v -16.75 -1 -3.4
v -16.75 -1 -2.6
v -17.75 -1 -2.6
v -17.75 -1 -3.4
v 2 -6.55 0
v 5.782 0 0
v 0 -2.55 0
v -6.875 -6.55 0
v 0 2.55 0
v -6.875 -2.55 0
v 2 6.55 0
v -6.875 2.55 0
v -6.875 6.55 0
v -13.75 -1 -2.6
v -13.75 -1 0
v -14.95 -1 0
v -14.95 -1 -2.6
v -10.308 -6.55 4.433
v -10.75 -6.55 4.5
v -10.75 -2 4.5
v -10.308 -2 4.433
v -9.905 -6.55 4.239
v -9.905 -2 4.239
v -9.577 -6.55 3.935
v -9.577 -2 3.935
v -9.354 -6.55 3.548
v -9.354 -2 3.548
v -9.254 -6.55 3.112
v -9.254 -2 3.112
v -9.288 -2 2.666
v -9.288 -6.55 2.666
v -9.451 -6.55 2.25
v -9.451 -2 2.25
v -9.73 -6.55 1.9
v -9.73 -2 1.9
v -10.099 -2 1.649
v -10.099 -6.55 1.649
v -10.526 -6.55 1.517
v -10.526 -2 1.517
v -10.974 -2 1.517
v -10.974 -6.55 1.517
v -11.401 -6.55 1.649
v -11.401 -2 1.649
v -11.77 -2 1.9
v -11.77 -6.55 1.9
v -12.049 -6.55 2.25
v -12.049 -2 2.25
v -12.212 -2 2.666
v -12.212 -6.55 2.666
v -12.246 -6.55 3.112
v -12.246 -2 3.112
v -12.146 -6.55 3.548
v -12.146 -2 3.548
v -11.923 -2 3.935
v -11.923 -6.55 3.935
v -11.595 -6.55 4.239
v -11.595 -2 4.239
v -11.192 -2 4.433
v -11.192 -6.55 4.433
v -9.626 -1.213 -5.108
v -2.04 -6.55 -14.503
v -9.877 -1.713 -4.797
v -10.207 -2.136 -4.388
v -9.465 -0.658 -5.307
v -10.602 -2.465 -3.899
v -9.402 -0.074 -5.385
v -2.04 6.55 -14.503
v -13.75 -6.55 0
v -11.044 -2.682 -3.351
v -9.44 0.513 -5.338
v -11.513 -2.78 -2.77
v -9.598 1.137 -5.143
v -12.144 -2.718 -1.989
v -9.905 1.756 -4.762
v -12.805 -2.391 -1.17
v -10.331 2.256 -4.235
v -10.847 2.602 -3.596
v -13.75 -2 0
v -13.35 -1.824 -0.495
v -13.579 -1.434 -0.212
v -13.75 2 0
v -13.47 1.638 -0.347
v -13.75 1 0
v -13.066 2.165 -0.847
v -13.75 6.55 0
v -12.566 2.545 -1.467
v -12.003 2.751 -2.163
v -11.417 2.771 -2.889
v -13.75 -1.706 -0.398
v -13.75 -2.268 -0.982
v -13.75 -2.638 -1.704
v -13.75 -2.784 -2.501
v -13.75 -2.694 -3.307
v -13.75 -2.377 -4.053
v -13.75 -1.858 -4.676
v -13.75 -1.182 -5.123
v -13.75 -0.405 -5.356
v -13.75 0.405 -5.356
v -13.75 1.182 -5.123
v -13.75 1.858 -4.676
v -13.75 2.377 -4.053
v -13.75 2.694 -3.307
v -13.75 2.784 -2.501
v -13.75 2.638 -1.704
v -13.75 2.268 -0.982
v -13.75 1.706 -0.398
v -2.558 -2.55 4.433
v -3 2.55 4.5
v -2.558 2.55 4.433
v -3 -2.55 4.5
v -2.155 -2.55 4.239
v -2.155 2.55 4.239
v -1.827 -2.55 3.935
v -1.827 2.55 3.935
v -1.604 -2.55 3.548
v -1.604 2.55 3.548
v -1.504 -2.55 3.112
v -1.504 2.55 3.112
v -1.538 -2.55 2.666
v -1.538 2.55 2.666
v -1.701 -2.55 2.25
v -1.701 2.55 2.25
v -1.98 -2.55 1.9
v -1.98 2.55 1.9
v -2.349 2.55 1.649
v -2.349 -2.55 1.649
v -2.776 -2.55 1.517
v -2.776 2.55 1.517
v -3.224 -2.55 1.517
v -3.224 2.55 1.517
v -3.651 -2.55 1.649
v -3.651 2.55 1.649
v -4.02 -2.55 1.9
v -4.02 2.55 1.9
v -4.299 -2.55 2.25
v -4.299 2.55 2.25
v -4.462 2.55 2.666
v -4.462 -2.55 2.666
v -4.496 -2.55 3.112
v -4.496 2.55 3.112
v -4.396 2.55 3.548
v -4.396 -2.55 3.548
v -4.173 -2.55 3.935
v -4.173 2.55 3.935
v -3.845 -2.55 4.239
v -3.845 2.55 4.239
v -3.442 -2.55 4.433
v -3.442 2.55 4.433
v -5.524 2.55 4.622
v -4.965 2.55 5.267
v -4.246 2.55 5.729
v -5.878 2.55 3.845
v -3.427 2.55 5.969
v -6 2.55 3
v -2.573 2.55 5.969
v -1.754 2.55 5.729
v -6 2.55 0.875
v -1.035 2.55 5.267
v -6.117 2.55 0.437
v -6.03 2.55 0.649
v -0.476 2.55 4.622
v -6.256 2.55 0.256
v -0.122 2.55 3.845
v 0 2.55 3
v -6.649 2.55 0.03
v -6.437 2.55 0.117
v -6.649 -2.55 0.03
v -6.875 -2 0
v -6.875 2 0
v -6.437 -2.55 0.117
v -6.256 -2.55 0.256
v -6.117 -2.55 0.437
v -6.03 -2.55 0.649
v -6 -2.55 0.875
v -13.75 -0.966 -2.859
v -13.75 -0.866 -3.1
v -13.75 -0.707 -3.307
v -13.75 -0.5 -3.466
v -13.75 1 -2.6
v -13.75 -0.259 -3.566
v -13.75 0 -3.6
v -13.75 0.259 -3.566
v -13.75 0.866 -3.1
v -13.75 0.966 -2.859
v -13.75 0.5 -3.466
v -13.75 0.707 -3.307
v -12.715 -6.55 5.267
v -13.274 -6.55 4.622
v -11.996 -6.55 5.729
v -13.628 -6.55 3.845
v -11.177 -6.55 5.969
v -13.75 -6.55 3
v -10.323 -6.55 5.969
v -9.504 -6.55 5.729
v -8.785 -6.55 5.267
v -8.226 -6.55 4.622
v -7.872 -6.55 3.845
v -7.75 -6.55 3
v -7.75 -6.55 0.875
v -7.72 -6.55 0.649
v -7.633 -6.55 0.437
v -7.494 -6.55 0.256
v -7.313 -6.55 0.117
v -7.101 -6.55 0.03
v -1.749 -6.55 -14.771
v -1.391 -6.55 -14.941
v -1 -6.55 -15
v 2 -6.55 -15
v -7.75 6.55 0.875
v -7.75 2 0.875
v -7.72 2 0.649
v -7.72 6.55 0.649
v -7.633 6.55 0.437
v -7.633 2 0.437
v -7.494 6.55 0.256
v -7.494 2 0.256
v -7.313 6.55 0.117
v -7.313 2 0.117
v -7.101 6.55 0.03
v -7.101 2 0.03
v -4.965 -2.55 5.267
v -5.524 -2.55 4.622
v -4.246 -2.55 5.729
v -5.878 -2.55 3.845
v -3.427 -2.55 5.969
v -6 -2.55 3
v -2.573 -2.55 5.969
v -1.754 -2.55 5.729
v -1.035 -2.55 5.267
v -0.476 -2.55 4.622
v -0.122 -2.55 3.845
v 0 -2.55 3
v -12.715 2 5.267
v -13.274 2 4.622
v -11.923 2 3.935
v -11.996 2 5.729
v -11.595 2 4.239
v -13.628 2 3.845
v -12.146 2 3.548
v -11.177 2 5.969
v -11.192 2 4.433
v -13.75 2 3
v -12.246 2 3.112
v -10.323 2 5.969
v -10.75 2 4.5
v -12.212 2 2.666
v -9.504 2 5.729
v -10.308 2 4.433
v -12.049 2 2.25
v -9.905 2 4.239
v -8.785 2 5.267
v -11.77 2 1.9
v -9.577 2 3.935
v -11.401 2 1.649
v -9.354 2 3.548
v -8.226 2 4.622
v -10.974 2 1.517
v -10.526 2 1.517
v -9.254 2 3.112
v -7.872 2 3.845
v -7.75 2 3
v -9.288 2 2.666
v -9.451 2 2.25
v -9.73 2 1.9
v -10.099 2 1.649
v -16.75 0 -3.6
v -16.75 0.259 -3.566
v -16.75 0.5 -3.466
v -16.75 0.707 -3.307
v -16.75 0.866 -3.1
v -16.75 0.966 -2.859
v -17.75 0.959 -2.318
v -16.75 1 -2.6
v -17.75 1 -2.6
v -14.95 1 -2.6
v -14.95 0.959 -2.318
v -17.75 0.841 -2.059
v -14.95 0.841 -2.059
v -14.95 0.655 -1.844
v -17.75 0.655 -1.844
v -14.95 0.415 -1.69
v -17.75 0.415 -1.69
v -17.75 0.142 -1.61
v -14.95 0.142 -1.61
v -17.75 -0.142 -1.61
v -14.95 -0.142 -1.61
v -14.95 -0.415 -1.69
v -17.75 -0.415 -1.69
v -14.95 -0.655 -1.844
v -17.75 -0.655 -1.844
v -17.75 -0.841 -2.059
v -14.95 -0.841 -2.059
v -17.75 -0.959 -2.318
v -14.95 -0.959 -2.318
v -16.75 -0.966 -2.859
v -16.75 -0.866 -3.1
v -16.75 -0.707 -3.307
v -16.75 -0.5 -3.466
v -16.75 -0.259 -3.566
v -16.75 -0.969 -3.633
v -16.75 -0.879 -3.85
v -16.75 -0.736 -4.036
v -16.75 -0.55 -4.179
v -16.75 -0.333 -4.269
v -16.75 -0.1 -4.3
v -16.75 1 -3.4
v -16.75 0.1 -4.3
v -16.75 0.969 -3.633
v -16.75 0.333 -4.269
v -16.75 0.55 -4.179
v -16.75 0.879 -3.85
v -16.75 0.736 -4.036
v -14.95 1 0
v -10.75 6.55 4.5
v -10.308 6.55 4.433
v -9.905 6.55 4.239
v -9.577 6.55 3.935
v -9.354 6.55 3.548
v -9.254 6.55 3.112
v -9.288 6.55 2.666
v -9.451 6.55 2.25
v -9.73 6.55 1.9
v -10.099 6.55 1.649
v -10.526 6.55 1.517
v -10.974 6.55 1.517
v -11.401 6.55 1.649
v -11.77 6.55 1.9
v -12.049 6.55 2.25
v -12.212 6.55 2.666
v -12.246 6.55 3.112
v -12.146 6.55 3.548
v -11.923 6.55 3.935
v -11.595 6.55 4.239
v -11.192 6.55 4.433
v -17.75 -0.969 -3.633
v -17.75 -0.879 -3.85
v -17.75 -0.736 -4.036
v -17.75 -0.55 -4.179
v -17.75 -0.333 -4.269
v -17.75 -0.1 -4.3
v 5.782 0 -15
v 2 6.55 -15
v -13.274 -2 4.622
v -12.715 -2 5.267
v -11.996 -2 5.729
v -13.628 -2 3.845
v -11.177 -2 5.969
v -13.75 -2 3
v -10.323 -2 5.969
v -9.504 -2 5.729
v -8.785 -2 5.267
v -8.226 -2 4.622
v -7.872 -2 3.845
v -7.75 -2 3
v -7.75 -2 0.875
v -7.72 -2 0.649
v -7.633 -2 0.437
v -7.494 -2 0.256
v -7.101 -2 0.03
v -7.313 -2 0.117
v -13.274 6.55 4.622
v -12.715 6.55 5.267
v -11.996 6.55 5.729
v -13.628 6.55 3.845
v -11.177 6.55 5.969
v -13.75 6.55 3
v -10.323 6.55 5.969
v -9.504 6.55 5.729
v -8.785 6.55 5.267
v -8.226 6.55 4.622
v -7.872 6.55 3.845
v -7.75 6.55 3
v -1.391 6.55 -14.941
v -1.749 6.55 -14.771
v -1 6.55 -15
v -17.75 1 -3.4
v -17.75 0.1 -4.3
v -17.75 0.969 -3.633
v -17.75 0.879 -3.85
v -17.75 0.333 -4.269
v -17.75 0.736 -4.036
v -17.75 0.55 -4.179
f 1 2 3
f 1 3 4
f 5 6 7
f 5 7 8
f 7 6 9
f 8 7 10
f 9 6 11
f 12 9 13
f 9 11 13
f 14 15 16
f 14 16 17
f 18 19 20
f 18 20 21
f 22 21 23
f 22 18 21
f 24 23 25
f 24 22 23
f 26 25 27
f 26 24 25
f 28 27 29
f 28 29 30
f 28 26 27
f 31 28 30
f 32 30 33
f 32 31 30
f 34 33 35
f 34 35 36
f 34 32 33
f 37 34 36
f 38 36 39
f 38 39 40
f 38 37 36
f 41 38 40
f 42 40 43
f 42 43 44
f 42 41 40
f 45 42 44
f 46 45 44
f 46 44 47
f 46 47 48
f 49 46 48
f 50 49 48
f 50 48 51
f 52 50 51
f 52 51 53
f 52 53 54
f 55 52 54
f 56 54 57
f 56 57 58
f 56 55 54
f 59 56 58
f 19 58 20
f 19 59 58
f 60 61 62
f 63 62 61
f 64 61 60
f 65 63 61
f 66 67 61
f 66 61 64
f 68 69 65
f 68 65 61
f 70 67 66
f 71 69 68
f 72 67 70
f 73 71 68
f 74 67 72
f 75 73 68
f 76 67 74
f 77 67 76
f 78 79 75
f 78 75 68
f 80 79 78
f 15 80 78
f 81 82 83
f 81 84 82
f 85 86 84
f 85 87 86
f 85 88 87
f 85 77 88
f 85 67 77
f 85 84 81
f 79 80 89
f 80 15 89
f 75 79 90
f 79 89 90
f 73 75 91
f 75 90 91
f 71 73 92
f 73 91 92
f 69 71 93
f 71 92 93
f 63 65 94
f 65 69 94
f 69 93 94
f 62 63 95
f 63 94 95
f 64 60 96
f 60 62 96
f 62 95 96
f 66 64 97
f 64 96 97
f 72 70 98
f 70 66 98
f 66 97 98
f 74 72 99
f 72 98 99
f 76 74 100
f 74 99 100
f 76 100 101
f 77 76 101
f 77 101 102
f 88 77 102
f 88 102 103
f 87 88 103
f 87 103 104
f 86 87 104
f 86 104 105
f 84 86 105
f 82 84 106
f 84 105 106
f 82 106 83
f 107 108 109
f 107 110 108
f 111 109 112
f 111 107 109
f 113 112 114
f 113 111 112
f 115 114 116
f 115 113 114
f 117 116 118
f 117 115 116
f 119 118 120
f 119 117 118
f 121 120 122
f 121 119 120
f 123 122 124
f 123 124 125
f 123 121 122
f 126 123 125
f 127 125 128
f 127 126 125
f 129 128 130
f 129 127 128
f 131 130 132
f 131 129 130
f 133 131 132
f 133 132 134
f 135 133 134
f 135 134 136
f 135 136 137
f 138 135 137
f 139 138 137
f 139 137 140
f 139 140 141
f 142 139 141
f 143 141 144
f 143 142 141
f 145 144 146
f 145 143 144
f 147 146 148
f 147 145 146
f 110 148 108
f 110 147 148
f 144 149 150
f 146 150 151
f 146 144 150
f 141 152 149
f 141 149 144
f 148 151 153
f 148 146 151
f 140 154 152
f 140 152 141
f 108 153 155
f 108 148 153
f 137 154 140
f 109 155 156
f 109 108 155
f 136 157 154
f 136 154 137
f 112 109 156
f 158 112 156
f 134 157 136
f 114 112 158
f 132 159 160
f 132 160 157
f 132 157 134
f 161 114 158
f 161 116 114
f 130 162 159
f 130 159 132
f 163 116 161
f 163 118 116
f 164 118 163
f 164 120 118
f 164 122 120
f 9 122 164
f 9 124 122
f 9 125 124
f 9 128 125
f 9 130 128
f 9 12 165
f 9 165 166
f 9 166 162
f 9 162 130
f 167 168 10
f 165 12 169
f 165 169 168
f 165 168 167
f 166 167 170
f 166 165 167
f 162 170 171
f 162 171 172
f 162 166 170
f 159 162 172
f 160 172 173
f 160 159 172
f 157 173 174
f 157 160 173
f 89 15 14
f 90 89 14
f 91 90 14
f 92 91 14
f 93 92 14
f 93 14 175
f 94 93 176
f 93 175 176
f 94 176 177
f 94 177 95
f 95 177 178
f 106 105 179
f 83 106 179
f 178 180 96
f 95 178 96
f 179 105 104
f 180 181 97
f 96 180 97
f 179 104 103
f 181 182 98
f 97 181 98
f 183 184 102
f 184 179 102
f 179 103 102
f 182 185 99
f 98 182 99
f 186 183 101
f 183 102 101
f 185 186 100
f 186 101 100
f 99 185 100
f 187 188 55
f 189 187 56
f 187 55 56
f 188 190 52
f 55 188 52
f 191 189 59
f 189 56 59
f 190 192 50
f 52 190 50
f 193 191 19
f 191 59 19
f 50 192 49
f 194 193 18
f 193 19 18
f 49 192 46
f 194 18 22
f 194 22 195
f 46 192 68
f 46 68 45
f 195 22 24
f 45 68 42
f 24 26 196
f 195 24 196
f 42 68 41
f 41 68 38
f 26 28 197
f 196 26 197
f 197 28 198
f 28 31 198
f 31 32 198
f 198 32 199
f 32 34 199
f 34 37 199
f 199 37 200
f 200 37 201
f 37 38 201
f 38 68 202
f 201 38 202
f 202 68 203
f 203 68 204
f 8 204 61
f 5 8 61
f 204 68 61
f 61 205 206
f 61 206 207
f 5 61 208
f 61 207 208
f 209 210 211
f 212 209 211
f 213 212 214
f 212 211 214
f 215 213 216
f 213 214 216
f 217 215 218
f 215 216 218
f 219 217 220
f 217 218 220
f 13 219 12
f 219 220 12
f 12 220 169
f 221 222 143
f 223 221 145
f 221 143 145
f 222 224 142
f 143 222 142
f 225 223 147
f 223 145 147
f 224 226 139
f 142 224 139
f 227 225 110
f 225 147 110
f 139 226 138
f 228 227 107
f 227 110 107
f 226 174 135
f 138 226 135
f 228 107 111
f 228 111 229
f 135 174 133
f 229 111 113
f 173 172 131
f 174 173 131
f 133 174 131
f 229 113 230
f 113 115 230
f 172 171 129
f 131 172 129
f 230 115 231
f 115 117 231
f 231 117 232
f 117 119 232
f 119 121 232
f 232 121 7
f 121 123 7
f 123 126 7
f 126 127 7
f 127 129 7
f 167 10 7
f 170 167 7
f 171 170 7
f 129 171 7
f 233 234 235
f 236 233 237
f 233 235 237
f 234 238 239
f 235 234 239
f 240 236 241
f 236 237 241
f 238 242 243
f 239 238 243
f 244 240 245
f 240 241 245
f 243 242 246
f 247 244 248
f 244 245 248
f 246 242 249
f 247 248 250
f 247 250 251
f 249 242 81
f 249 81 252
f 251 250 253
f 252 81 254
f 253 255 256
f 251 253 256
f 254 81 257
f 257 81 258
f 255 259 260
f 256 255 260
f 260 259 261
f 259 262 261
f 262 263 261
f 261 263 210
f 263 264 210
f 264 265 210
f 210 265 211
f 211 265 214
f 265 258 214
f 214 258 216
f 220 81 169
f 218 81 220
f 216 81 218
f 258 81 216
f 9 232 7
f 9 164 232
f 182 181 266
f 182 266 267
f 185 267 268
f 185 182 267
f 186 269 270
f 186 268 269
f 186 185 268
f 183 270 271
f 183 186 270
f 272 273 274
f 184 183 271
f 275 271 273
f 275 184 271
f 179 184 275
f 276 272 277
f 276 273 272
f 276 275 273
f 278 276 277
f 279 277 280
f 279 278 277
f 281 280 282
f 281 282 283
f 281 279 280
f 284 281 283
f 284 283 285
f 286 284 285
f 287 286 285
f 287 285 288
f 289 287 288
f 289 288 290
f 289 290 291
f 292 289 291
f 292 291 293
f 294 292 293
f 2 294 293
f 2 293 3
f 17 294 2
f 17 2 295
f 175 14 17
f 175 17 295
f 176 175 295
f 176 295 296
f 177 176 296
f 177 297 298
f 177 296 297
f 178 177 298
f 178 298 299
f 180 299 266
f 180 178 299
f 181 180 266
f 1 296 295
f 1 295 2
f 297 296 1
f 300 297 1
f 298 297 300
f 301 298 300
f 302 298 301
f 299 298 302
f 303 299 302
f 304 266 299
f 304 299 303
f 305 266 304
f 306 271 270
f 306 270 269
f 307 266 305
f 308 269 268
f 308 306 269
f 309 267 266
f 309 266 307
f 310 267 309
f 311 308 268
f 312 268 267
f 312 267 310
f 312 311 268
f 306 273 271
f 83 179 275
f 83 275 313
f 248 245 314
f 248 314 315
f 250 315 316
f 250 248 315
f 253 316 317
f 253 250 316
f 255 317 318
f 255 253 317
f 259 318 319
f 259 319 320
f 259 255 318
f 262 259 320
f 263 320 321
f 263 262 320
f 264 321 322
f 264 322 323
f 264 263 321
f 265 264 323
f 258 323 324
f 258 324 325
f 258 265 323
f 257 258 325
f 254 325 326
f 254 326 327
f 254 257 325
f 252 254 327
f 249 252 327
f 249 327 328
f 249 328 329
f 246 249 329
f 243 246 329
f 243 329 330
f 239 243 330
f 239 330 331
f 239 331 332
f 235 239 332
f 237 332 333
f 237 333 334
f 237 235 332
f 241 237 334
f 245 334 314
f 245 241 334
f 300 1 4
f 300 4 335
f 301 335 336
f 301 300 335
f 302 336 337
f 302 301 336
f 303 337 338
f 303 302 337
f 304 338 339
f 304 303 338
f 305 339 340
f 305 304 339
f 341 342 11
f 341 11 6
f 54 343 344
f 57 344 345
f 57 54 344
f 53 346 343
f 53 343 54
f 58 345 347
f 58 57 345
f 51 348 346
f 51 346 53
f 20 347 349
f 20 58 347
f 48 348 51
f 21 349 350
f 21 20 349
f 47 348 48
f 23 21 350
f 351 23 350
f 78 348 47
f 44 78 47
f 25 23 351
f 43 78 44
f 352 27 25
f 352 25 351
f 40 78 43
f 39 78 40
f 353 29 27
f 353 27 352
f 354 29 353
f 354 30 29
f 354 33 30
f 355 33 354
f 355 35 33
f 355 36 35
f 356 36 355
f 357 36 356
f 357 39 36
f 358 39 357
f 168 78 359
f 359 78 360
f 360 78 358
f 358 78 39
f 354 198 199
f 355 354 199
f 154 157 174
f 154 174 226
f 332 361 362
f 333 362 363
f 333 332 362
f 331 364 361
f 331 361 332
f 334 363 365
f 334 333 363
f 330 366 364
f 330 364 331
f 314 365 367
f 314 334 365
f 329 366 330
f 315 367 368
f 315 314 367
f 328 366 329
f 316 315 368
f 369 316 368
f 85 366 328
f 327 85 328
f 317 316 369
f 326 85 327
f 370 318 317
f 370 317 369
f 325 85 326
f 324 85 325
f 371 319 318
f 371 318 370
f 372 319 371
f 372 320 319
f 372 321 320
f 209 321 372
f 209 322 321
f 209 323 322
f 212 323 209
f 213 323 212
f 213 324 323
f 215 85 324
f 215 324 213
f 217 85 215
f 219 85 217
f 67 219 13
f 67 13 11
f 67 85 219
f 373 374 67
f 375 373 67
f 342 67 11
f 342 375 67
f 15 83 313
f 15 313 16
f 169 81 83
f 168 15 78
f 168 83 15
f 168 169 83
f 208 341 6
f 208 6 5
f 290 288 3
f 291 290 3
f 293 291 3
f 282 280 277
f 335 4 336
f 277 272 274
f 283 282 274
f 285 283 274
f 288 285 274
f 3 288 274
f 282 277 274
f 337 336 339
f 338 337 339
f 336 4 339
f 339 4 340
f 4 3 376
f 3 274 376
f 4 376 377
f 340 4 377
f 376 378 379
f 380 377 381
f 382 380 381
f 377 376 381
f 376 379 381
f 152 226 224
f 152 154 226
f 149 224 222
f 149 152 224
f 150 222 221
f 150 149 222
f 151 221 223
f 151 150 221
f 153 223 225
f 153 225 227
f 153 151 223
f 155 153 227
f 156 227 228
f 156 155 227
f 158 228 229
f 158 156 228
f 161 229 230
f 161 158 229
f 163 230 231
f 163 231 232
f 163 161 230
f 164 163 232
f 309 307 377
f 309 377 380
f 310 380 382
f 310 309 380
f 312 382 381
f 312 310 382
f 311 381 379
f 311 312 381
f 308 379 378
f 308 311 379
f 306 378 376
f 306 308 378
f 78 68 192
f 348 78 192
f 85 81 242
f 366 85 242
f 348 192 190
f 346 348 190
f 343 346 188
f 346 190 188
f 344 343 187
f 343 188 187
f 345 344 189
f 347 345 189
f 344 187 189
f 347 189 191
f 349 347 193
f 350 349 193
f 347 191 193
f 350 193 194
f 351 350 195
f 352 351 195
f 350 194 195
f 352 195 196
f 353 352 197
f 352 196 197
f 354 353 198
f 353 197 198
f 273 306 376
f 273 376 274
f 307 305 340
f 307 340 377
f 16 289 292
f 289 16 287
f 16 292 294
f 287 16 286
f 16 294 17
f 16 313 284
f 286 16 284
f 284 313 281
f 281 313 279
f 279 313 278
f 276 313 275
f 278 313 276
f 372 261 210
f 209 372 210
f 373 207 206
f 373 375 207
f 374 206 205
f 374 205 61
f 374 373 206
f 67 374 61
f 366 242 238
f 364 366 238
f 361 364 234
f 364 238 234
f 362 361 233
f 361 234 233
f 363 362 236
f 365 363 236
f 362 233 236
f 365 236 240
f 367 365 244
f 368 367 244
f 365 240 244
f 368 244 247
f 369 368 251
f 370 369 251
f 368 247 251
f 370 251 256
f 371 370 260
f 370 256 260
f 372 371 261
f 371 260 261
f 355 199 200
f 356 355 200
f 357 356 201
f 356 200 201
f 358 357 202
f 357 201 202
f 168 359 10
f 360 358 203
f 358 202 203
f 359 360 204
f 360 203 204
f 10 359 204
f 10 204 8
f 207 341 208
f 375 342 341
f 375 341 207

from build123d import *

# Parameters (mm, degrees)
BOSS_EXTRUDE3_DEPTH  = 6.55
BOSS_EXTRUDE4_DEPTH  = 15
BOSS_EXTRUDE5_START  = 2
SKETCH1_4_R          = 1.5
BOSS_EXTRUDE5_DEPTH  = 4.55
BOSS_EXTRUDE6_START  = -6.55
SKETCH1_6_R          = 1.5
BOSS_EXTRUDE6_DEPTH  = 4.55
SKETCH1_8_R          = 1.5
BOSS_EXTRUDE11_DEPTH = 2.55
BOSS_EXTRUDE12_START = -13.75
BOSS_EXTRUDE12_DEPTH = 3.471884434
BOSS_EXTRUDE13_START = -13.75
SKETCH4_6_R          = 1
BOSS_EXTRUDE13_DEPTH = 13.75
BOSS_EXTRUDE14_START = -13.75
SKETCH4_7_R          = 1
BOSS_EXTRUDE14_DEPTH = 4
BOSS_EXTRUDE15_START = -16.75
BOSS_EXTRUDE15_DEPTH = 1
BOSS_EXTRUDE16_START = -13.75
BOSS_EXTRUDE16_DEPTH = 1.2


# Read off the part's stored shape, not the designer's step: Boss-Extrude12
with BuildPart() as part:
    # Sketch1 → Boss-Extrude3 (new, symmetric)
    with BuildSketch(Plane(origin=(0, 0, 0), x_dir=(1, 0, 0), z_dir=(0, 1, 0))):
        with BuildLine():
            Line((-2.040057994, 14.503003078), (-13.75, 0))
            Line((-13.75, 0), (-6.875, 0))
            Line((-6.875, 0), (0, 0))
            Line((0, 0), (2, 0))
            Line((2, 0), (2, 15))
            Line((2, 15), (-1, 15))
            ThreePointArc((-1, 15), (-1.576352013, 14.869367868), (-2.040057994, 14.503003078))
        make_face()
    extrude(amount=BOSS_EXTRUDE3_DEPTH, both=True)

    # Sketch2 → Boss-Extrude4 (add)
    with BuildSketch(Plane(origin=(0, 0, -15), x_dir=(-1, 0, 0), z_dir=(0, 0, -1))):
        Polygon((-2, 6.55), (-5.781644263, 0), (-2, -6.55), align=None)
    extrude(amount=-BOSS_EXTRUDE4_DEPTH)

    # Sketch1<4> → Boss-Extrude5 (add)
    with BuildSketch(Plane(origin=(0, 0, 0), x_dir=(1, 0, 0), z_dir=(0, 1, 0)).offset(BOSS_EXTRUDE5_START)):
        with BuildLine():
            Line((-6.875, 0), (-13.75, 0))
            Line((-13.75, 0), (-13.75, -3))
            ThreePointArc((-13.75, -3), (-10.75, -6), (-7.75, -3))
            Line((-7.75, -3), (-7.75, -0.875))
            ThreePointArc((-7.75, -0.875), (-7.493718434, -0.256281566), (-6.875, 0))
        make_face()
        with Locations(Location((-10.75, -3, 0), (0, 0, 270))):
            Circle(SKETCH1_4_R, mode=Mode.SUBTRACT)
    extrude(amount=BOSS_EXTRUDE5_DEPTH)

    # Sketch1<6> → Boss-Extrude6 (add)
    with BuildSketch(Plane(origin=(0, 0, 0), x_dir=(1, 0, 0), z_dir=(0, 1, 0)).offset(BOSS_EXTRUDE6_START)):
        with BuildLine():
            Line((-6.875, 0), (-13.75, 0))
            Line((-13.75, 0), (-13.75, -3))
            ThreePointArc((-13.75, -3), (-10.75, -6), (-7.75, -3))
            Line((-7.75, -3), (-7.75, -0.875))
            ThreePointArc((-7.75, -0.875), (-7.493718434, -0.256281566), (-6.875, 0))
        make_face()
        with Locations(Location((-10.75, -3, 0), (0, 0, 270))):
            Circle(SKETCH1_6_R, mode=Mode.SUBTRACT)
    extrude(amount=BOSS_EXTRUDE6_DEPTH)

    # Sketch1<8> → Boss-Extrude11 (add, symmetric)
    with BuildSketch(Plane(origin=(0, 0, 0), x_dir=(1, 0, 0), z_dir=(0, 1, 0))):
        with BuildLine():
            Line((0, 0), (-6.875, 0))
            ThreePointArc((-6.875, 0), (-6.256281566, -0.256281566), (-6, -0.875))
            Line((-6, -0.875), (-6, -3))
            ThreePointArc((-6, -3), (-3, -6), (0, -3))
            Line((0, -3), (0, 0))
        make_face()
        with Locations(Location((-3, -3, 0), (0, 0, 270))):
            Circle(SKETCH1_8_R, mode=Mode.SUBTRACT)
    extrude(amount=BOSS_EXTRUDE11_DEPTH, both=True)

    # Boss-Extrude12 outline → Boss-Extrude12 (add)
    with BuildSketch(Plane(origin=(0, 0, 0), x_dir=(0, 0, -1), z_dir=(1, 0, 0)).offset(BOSS_EXTRUDE12_START)):
        with BuildLine():
            Line((3.4, 1), (0, 1))
            Line((0, 1), (0, -1))
            Line((0, -1), (3.4, -1))
            ThreePointArc((3.4, -1), (4.036396103, -0.736396103), (4.3, -0.1))
            Line((4.3, -0.1), (4.3, 0.1))
            ThreePointArc((4.3, 0.1), (4.036396103, 0.736396103), (3.4, 1))
        make_face()
    extrude(amount=BOSS_EXTRUDE12_DEPTH)

    # Sketch4<6> → Boss-Extrude13 (add)
    with BuildSketch(Plane(origin=(0, 0, 0), x_dir=(0, 0, -1), z_dir=(1, 0, 0)).offset(BOSS_EXTRUDE13_START)):
        with Locations((2.6, 0)):
            Circle(SKETCH4_6_R)
        with BuildLine():
            Line((2.6, -1), (0, -1))
            ThreePointArc((0, -1), (5.385677655, 0), (0, 1))
            Line((0, 1), (2.6, 1))
            Line((2.6, 1), (3.4, 1))
            ThreePointArc((3.4, 1), (4.036396103, 0.736396103), (4.3, 0.1))
            Line((4.3, 0.1), (4.3, -0.1))
            ThreePointArc((4.3, -0.1), (4.036396103, -0.736396103), (3.4, -1))
            Line((3.4, -1), (2.6, -1))
        make_face()
    extrude(amount=BOSS_EXTRUDE13_DEPTH)

    # Sketch4<7> → Boss-Extrude14 (add)
    with BuildSketch(Plane(origin=(0, 0, 0), x_dir=(0, 0, -1), z_dir=(1, 0, 0)).offset(BOSS_EXTRUDE14_START)):
        with Locations((2.6, 0)):
            Circle(SKETCH4_7_R)
    extrude(amount=-BOSS_EXTRUDE14_DEPTH)

    # Sketch4<8> → Boss-Extrude15 (add)
    with BuildSketch(Plane(origin=(0, 0, 0), x_dir=(0, 0, -1), z_dir=(1, 0, 0)).offset(BOSS_EXTRUDE15_START)):
        with BuildLine():
            ThreePointArc((3.6, 0), (3.307106781, -0.707106781), (2.6, -1))
            Line((2.6, -1), (3.4, -1))
            ThreePointArc((3.4, -1), (4.036396103, -0.736396103), (4.3, -0.1))
            Line((4.3, -0.1), (4.3, 0.1))
            ThreePointArc((4.3, 0.1), (4.036396103, 0.736396103), (3.4, 1))
            Line((3.4, 1), (2.6, 1))
            ThreePointArc((2.6, 1), (3.307106781, 0.707106781), (3.6, 0))
        make_face()
    extrude(amount=-BOSS_EXTRUDE15_DEPTH)

    # Sketch4<9> → Boss-Extrude16 (add)
    with BuildSketch(Plane(origin=(0, 0, 0), x_dir=(0, 0, -1), z_dir=(1, 0, 0)).offset(BOSS_EXTRUDE16_START)):
        with BuildLine():
            Line((0, -1), (2.6, -1))
            ThreePointArc((2.6, -1), (1.6, 0), (2.6, 1))
            Line((2.6, 1), (0, 1))
            Line((0, 1), (0, -1))
        make_face()
    extrude(amount=-BOSS_EXTRUDE16_DEPTH)


solid = part.part
